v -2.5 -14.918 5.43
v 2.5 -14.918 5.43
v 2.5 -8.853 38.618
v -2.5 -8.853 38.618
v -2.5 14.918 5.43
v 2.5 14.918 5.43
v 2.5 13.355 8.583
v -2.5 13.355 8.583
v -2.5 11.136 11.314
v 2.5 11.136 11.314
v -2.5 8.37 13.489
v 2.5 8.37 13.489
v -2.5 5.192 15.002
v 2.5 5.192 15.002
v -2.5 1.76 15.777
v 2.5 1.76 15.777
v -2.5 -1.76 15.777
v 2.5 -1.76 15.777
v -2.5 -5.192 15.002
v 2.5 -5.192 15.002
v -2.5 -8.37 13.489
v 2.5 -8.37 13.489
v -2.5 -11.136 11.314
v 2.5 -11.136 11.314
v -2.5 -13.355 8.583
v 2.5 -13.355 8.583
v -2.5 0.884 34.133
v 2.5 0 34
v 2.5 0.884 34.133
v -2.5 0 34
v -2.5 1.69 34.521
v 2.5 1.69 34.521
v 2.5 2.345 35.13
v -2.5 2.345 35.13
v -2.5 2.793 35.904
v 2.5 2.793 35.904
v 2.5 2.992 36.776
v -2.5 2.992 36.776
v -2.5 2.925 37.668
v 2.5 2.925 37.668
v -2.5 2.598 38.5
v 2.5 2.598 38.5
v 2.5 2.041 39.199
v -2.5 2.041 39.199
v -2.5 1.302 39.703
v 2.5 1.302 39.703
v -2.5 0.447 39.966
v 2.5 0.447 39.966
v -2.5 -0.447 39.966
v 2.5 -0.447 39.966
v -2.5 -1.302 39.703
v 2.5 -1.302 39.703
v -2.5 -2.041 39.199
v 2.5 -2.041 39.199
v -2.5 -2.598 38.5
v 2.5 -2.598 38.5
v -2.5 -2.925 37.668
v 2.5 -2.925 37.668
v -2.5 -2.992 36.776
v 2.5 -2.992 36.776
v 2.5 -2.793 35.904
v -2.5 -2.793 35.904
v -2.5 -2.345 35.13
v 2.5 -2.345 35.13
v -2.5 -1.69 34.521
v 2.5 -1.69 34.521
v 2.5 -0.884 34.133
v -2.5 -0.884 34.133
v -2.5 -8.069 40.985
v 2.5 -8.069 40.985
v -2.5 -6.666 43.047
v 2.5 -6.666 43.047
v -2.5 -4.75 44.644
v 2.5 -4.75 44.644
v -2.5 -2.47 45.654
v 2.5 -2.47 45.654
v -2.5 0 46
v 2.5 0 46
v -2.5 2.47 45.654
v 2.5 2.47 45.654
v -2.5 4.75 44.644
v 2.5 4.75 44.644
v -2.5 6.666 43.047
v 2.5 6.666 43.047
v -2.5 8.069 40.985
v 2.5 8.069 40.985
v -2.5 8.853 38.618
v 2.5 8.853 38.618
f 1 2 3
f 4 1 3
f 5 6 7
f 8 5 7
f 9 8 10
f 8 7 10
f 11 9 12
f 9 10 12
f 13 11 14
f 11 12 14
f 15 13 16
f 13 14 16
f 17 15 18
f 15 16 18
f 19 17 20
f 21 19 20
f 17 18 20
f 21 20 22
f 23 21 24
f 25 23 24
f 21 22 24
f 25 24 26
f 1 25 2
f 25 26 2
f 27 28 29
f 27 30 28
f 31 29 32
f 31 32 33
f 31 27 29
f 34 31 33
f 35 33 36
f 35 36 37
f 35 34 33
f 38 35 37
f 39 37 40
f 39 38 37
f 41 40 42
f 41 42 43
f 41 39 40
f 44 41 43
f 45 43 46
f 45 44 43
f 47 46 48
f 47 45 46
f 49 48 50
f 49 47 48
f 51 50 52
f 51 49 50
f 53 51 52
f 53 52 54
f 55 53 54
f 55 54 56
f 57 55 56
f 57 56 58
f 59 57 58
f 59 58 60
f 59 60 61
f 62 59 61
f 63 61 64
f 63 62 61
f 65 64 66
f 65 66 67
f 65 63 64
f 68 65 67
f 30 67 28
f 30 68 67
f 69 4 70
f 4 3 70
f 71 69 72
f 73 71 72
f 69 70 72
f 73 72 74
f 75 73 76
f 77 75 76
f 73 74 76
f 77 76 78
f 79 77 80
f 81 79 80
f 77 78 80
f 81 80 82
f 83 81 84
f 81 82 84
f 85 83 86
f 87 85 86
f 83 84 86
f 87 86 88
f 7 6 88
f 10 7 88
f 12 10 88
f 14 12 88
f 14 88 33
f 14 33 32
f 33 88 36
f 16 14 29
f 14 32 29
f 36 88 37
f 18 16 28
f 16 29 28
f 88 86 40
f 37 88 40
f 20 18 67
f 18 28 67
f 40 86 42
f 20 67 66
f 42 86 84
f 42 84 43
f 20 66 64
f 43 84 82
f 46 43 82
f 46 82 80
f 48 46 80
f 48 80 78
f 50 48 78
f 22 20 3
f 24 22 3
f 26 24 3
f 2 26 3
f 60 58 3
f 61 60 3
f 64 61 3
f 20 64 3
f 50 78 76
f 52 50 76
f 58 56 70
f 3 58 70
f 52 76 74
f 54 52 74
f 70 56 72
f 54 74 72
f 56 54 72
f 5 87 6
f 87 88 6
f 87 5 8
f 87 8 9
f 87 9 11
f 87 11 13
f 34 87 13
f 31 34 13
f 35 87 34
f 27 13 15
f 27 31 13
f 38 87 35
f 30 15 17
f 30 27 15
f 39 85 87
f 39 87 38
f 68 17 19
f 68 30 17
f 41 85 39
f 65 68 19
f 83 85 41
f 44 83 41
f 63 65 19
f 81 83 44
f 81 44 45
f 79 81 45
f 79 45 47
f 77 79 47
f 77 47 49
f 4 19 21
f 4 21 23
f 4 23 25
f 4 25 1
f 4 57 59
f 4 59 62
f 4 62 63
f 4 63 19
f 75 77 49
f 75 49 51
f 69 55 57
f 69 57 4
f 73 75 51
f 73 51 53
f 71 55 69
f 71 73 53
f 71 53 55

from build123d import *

# Parameters (mm, degrees)
SKETCH1_R           = 3
BOSS_EXTRUDE1_DEPTH = 2.5


with BuildPart() as part:
    # Sketch1 → Boss-Extrude1 (new, symmetric)
    with BuildSketch(Plane.YZ):
        with BuildLine():
            Line((-14.917620355, 5.429569775), (-8.85341753, 38.617713829))
            ThreePointArc((-8.85341753, 38.617713829), (0, 46), (8.85341753, 38.617713829))
            Line((8.85341753, 38.617713829), (14.917620355, 5.429569775))
            ThreePointArc((14.917620355, 5.429569775), (0, 15.875), (-14.917620355, 5.429569775))
        make_face()
        with Locations(Location((0, 37, 0), (0, 0, 270))):
            Circle(SKETCH1_R, mode=Mode.SUBTRACT)
    extrude(amount=BOSS_EXTRUDE1_DEPTH, both=True)


solid = part.part
